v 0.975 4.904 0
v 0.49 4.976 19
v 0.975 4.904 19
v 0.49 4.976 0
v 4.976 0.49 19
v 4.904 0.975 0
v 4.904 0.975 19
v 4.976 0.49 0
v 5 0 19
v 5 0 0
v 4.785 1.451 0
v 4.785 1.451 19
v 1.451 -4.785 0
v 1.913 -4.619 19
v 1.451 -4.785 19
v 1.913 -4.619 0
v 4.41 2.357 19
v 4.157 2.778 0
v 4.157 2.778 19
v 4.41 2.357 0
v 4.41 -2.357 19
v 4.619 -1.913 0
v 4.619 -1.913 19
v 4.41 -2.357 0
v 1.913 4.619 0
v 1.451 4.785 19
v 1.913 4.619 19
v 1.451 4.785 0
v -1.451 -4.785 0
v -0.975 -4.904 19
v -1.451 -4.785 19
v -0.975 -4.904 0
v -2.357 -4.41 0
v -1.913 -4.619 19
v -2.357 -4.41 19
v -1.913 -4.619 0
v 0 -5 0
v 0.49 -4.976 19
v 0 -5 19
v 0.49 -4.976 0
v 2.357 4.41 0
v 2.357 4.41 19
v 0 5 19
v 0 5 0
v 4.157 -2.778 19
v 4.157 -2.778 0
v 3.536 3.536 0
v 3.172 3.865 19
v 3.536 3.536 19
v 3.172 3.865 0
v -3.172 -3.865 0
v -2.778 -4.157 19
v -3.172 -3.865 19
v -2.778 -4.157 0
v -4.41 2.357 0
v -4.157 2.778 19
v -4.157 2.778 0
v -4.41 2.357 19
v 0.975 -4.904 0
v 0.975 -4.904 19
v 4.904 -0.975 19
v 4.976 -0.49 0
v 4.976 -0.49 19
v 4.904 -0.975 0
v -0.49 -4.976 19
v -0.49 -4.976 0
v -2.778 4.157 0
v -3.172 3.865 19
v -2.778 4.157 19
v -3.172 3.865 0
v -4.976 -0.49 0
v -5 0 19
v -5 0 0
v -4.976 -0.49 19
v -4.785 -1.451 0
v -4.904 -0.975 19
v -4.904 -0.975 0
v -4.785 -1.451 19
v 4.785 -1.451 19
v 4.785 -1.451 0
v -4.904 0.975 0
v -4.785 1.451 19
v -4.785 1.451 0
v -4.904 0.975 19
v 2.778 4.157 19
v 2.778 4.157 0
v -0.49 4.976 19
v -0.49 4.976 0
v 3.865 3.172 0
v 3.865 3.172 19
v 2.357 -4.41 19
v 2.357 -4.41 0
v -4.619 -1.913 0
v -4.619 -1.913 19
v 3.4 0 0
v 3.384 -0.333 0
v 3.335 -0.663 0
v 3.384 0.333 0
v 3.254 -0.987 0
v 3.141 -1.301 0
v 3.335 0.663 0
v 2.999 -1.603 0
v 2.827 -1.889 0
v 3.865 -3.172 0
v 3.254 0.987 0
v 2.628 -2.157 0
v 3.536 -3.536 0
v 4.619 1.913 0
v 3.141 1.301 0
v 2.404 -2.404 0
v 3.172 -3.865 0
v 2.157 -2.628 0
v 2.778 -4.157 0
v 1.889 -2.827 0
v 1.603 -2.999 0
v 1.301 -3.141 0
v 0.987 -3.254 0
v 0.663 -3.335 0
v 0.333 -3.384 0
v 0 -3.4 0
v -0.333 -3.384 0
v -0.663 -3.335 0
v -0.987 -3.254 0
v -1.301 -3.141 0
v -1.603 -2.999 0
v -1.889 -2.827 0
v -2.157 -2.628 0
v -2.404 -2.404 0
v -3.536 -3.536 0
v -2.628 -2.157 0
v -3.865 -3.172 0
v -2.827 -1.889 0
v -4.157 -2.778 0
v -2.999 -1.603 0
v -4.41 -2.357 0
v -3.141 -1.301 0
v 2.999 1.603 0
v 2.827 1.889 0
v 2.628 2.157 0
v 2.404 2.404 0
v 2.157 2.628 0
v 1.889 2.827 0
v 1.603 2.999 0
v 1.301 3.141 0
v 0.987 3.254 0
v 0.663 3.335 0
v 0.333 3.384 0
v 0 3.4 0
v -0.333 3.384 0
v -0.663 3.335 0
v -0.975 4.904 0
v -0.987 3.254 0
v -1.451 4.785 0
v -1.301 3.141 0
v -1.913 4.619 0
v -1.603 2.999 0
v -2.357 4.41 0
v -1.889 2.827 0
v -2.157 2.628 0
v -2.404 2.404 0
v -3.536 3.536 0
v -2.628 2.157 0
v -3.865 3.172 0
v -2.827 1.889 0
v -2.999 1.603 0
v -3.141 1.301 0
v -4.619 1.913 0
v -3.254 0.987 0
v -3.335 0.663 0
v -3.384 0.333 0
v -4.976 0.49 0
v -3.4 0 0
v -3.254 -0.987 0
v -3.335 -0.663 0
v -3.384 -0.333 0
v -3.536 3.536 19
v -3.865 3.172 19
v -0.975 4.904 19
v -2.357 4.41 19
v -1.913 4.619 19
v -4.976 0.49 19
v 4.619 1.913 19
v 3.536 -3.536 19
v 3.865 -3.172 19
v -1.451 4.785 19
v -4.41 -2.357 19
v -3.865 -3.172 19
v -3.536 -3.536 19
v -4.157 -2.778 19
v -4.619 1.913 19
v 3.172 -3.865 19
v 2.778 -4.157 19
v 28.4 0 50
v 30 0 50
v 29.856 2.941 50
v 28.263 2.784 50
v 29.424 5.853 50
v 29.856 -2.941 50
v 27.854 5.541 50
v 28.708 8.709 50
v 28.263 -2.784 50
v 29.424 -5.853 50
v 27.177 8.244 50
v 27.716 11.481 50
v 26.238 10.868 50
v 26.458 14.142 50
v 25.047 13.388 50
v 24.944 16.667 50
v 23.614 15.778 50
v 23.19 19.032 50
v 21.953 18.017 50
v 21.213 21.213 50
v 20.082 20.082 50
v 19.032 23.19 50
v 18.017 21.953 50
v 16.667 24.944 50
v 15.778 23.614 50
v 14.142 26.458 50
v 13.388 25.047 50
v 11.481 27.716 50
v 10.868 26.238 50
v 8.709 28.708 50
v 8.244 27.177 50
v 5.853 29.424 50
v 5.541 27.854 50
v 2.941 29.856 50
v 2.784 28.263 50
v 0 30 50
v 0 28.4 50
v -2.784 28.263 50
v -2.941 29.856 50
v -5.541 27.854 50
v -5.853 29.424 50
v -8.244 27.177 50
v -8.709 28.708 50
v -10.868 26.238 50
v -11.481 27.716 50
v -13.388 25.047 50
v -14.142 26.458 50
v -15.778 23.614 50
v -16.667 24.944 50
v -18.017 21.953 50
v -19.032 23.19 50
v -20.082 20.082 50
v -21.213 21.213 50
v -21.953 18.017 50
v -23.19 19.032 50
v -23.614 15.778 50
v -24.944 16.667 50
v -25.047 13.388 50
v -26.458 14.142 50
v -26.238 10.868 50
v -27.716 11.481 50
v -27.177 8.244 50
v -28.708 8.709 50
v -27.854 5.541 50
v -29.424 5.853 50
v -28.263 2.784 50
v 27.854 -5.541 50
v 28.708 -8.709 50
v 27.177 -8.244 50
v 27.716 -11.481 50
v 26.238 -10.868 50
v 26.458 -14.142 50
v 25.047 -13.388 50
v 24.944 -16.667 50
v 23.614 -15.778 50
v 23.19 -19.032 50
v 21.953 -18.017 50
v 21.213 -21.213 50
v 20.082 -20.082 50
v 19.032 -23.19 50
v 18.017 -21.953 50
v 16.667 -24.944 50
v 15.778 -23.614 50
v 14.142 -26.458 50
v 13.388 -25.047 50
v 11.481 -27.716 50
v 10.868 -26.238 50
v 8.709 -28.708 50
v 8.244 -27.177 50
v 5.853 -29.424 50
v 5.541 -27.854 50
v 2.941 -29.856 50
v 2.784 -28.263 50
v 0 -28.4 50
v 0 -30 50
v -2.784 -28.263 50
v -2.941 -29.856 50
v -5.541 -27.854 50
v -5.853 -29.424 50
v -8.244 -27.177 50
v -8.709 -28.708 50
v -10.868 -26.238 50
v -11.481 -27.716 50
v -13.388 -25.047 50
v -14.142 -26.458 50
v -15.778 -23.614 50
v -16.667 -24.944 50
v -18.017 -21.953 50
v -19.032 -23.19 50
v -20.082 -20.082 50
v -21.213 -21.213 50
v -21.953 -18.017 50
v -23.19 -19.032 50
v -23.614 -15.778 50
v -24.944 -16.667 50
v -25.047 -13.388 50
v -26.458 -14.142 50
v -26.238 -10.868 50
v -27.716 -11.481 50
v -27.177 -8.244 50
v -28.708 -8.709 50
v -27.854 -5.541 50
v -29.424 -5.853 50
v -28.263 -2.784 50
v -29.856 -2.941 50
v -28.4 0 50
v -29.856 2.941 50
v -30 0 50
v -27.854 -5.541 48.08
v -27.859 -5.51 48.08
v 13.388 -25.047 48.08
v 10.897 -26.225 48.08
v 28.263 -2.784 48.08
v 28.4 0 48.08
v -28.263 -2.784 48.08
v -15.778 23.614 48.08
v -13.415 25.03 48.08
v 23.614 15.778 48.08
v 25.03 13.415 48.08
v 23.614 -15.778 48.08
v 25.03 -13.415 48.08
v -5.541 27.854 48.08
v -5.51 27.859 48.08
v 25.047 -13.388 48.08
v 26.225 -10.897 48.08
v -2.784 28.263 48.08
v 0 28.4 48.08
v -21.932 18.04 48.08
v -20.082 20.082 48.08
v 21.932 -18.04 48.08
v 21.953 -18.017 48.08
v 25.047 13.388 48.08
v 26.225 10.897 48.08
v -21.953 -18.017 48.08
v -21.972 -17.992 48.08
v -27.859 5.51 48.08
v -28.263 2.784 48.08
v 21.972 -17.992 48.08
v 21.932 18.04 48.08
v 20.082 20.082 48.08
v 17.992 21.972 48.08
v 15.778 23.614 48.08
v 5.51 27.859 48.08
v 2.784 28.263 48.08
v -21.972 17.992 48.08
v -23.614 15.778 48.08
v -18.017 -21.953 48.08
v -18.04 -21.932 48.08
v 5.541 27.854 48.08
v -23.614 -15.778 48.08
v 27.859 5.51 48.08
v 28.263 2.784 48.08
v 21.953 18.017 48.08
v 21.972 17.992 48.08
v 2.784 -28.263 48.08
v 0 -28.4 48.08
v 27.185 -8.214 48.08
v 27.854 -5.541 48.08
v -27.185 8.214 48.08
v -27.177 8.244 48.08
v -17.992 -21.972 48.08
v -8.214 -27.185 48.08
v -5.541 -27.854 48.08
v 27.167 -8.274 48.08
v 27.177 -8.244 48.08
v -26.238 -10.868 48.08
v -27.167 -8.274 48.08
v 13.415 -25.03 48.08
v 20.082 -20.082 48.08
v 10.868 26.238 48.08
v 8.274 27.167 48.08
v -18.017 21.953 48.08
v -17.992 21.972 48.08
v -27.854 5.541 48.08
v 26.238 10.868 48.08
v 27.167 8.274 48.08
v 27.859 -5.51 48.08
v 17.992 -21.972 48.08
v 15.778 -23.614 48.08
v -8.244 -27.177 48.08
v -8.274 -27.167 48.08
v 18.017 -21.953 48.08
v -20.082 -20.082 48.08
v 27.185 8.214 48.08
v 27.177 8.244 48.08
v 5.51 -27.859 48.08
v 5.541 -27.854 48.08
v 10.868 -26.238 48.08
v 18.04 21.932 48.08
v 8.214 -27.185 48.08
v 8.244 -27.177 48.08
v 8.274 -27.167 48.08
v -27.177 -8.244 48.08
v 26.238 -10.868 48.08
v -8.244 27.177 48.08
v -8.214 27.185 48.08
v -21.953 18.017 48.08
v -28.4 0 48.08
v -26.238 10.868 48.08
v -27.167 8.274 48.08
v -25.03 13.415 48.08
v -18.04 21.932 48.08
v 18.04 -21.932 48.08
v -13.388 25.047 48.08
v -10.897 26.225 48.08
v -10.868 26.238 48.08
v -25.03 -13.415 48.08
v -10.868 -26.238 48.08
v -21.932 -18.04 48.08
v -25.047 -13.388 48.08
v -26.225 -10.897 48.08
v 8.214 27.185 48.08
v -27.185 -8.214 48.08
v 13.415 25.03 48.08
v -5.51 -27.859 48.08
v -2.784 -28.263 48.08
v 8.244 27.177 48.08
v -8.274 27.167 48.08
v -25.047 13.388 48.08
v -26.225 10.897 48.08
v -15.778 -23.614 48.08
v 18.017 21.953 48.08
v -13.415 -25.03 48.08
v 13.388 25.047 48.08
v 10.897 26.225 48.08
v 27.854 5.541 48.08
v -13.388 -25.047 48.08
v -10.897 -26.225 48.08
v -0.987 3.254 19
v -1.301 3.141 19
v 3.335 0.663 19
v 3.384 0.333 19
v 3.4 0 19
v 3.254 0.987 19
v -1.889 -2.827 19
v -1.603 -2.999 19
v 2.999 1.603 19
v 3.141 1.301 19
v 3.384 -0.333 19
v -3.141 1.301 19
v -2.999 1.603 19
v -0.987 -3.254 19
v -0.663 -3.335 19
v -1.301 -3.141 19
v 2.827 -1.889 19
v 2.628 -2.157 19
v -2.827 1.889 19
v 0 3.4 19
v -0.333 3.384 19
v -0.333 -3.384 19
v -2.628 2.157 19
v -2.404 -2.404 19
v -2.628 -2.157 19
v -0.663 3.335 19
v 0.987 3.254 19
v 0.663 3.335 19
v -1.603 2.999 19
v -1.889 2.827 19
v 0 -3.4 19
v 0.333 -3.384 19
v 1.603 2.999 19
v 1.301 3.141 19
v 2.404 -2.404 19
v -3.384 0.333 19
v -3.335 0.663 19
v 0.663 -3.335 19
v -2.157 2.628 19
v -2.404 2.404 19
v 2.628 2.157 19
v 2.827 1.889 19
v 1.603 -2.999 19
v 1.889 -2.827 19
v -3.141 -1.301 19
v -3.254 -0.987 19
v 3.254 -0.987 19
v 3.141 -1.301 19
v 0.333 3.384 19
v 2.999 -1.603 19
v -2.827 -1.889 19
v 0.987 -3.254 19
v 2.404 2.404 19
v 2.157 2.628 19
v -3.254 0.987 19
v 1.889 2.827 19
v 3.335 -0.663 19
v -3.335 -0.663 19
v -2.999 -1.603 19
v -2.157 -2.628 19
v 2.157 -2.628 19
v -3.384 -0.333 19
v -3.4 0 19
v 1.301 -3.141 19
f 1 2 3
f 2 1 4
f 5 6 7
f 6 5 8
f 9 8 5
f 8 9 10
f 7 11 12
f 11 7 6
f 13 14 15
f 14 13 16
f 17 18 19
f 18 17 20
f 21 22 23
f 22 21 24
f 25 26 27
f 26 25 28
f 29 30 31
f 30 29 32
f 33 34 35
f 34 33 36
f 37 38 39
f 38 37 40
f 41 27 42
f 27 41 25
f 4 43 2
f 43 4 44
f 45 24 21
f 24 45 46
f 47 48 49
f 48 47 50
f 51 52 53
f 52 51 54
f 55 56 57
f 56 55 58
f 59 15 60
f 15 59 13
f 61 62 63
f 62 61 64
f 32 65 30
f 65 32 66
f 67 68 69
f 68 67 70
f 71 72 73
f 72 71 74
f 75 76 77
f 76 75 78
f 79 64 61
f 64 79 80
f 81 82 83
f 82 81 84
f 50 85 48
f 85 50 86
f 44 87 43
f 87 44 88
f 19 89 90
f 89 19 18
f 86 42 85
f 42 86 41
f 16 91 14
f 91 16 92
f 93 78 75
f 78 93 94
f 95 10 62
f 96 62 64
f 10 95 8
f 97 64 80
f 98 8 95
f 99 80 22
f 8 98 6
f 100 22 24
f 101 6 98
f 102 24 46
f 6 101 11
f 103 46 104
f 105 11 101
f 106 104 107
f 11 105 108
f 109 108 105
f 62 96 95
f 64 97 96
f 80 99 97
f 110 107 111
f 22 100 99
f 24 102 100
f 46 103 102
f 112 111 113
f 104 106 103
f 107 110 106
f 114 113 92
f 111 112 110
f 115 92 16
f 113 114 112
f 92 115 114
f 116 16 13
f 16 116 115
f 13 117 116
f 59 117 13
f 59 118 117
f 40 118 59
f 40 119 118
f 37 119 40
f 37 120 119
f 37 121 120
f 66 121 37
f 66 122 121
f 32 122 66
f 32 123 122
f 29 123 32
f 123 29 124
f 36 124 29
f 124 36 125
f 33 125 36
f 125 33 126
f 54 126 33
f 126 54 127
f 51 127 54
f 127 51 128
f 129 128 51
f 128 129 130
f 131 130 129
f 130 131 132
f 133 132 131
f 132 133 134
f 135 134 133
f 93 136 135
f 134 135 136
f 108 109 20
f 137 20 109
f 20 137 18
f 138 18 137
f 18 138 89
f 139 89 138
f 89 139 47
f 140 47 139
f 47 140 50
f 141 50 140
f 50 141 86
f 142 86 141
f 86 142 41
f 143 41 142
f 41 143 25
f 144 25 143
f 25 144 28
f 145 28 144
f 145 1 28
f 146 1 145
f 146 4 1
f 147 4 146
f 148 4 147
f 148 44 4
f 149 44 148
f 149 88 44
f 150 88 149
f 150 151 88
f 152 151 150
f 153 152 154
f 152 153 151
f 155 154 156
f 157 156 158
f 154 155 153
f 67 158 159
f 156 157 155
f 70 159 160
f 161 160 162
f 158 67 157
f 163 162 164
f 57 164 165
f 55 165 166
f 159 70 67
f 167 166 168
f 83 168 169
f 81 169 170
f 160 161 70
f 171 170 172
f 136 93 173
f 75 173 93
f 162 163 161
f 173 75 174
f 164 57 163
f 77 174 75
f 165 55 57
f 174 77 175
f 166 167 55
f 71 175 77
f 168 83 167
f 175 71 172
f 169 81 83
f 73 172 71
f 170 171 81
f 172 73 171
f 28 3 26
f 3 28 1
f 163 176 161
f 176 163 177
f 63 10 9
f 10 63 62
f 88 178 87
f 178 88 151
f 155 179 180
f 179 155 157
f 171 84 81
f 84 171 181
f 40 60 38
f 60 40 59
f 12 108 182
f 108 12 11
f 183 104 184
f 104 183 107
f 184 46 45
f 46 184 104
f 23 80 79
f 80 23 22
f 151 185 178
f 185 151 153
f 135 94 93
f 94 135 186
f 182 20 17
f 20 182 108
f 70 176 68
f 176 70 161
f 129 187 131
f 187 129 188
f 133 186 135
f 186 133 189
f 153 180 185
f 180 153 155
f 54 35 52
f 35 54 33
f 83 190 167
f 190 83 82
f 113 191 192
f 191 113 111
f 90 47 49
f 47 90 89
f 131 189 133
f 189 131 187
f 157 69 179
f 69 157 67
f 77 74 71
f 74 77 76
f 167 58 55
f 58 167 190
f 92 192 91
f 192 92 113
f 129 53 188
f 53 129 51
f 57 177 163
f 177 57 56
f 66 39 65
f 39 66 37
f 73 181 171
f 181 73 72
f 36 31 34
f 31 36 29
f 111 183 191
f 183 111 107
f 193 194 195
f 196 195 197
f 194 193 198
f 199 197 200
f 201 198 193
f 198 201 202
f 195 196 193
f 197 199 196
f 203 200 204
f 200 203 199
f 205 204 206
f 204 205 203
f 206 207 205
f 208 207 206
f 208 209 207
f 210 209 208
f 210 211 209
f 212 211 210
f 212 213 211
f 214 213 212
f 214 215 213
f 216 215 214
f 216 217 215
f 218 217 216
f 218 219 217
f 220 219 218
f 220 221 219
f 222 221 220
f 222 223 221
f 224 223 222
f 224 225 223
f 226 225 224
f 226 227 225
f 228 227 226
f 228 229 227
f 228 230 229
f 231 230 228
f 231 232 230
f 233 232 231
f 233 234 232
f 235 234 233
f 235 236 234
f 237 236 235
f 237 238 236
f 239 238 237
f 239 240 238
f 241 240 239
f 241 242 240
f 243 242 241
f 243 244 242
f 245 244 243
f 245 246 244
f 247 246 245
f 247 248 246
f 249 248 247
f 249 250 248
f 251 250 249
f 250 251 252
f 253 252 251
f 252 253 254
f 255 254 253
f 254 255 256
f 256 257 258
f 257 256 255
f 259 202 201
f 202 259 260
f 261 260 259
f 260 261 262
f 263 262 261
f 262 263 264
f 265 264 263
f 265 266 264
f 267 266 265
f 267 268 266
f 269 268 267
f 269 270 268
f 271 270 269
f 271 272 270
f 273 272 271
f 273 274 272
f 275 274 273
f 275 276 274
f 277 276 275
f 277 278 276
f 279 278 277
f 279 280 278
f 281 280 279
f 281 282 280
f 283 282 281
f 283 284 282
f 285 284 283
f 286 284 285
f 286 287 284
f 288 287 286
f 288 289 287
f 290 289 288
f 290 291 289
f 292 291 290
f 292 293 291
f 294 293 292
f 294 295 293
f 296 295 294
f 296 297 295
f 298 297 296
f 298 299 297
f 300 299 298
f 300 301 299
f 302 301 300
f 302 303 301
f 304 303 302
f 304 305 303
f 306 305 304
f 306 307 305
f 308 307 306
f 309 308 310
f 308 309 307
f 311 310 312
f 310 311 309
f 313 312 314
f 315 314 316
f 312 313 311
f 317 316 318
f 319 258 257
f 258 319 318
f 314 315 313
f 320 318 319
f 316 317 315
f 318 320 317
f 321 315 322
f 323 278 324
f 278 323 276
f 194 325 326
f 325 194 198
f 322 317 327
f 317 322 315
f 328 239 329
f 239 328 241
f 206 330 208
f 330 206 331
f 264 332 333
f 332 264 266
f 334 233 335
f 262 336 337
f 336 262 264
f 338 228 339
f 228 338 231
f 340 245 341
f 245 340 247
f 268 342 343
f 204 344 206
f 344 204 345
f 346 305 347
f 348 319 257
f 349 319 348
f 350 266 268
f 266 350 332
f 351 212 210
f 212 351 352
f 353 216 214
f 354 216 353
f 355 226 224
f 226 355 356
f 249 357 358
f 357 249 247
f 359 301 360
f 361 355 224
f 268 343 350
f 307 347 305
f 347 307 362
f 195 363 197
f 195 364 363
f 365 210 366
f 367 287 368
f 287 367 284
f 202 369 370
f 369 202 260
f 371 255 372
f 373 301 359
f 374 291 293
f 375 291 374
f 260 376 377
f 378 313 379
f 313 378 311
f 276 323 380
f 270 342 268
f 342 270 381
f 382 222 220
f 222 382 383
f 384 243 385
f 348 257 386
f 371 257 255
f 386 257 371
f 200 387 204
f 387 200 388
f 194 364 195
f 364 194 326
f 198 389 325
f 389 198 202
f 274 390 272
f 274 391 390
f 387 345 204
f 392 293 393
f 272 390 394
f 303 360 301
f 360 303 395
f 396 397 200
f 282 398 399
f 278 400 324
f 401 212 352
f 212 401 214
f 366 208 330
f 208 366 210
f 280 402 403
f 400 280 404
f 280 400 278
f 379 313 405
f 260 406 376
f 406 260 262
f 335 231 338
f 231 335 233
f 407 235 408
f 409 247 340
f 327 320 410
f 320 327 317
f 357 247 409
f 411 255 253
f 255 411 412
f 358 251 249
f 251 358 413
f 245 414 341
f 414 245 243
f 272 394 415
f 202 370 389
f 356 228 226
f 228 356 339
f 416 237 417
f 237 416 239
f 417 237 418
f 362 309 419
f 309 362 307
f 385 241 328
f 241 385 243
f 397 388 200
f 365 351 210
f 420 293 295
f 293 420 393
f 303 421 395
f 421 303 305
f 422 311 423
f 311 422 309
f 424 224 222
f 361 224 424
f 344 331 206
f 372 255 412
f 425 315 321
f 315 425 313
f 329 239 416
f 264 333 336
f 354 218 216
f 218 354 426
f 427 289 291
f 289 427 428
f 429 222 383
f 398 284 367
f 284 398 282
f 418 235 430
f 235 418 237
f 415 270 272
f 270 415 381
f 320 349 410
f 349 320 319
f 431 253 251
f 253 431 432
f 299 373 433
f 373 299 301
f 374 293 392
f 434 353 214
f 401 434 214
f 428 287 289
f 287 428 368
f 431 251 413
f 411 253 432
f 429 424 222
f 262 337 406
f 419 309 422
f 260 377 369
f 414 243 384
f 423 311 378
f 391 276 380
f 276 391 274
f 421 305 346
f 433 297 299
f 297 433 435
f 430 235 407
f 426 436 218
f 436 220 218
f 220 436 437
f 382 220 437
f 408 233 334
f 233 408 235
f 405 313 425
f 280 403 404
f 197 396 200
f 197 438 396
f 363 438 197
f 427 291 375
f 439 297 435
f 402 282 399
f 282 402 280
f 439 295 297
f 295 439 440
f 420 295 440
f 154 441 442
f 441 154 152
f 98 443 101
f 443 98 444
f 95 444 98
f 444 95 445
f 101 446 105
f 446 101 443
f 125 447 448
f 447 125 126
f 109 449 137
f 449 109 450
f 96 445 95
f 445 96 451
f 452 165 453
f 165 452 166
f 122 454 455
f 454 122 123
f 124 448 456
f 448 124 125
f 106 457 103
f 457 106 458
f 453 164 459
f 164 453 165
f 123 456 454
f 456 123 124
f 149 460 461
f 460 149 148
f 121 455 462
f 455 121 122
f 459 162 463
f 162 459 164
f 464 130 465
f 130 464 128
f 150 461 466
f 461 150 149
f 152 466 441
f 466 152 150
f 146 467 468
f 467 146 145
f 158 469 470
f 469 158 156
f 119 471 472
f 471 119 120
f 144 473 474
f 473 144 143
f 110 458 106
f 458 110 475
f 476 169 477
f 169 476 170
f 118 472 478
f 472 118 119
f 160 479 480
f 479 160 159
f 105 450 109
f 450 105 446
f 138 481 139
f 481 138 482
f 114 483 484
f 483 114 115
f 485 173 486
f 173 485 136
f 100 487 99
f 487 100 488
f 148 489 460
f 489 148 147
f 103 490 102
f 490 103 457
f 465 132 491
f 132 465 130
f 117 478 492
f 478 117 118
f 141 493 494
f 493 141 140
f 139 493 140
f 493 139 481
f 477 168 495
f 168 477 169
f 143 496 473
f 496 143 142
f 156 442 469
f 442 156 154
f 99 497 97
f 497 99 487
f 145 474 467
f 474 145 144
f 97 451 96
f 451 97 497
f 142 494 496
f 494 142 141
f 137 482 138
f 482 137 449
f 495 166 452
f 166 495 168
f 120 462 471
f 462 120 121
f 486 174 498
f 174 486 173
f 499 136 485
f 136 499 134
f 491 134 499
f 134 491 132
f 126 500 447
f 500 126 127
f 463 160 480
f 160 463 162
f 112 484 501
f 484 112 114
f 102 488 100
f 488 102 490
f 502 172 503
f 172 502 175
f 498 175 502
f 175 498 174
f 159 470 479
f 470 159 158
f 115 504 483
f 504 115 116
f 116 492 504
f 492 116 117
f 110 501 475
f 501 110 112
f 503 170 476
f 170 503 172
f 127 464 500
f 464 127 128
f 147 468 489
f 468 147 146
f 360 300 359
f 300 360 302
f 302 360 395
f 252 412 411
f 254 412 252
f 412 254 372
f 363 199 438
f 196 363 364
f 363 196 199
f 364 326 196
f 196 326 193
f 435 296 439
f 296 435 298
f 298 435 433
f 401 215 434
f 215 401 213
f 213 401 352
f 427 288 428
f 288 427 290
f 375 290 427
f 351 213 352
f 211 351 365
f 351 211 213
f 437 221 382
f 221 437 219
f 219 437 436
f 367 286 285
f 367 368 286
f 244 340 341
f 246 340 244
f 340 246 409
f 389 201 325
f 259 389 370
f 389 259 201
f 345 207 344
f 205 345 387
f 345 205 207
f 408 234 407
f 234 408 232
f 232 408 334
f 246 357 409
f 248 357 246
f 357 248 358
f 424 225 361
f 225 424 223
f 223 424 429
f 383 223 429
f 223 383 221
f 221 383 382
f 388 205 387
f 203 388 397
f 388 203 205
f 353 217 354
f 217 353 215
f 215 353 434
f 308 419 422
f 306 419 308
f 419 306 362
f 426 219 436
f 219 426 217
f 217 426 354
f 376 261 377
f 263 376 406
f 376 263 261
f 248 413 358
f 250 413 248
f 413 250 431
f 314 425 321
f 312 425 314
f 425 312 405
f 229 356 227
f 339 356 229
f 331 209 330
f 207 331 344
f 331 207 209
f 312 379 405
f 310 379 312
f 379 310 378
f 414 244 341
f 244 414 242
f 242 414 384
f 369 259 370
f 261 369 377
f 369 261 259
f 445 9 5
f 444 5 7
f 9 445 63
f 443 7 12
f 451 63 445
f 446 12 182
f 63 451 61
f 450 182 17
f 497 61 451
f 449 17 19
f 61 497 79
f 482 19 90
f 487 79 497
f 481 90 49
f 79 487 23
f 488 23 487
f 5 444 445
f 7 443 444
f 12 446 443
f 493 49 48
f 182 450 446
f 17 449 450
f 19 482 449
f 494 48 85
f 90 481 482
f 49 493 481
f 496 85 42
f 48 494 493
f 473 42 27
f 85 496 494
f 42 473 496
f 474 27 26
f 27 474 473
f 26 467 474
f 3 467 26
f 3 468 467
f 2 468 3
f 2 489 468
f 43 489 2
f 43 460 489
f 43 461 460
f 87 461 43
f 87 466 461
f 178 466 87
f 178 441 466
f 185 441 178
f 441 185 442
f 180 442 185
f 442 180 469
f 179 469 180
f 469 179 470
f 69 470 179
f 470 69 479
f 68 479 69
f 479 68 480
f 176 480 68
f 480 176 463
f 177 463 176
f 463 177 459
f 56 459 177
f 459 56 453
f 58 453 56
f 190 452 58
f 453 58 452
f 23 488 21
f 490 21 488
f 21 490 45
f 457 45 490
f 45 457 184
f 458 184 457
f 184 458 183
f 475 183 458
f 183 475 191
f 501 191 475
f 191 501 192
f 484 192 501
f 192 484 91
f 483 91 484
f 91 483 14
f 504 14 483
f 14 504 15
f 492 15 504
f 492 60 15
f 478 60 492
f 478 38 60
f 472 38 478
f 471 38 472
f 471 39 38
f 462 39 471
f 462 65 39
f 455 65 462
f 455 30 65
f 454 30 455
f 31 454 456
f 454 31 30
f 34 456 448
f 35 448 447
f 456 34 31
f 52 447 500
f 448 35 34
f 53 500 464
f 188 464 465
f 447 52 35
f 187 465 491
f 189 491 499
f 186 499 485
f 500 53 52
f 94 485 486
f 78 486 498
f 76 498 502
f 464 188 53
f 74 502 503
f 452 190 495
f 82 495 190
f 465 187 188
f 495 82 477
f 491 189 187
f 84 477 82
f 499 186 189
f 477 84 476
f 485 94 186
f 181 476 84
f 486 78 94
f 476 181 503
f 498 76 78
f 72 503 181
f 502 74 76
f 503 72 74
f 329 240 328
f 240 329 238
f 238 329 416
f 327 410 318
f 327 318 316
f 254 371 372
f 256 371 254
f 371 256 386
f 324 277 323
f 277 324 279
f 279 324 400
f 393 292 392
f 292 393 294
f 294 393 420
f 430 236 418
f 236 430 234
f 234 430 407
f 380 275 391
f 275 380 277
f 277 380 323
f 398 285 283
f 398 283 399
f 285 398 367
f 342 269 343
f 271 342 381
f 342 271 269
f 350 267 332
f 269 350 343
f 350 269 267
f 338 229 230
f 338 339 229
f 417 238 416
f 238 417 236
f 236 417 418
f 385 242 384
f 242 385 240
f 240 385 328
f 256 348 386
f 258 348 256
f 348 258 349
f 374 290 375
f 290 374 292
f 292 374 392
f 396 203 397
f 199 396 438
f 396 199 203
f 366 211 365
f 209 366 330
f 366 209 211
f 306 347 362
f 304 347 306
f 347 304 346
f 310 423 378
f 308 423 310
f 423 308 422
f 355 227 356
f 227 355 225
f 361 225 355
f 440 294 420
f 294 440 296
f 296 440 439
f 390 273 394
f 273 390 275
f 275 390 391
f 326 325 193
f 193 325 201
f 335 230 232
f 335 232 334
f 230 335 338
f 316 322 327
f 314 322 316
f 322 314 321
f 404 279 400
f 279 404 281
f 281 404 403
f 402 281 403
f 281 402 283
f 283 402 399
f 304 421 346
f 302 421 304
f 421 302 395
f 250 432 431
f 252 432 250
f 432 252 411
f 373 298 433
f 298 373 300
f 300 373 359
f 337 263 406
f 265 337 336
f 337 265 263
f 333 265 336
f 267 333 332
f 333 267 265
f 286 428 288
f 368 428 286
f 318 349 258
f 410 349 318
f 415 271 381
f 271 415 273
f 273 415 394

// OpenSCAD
// Funnel - a spout (tube) sitting under a conical section, open at both ends for fluid flow.
// NOVEL general part for a lab or control application.
//

spout_d = 10;
spout_l = 20;
cone_d  = 60;
wall    = 1.6;

$fn = 64;

ib = spout_d - 2 * wall;   // spout bore
ic = cone_d - 2 * wall;    // cone inner diameter at the spout join

difference() {
    union() {
        cylinder(h = spout_l, d = spout_d);                 // spout
        translate([0, 0, spout_l]) cylinder(h = 30, d = spout_d, $fn = 64);
        translate([0, 0, spout_l]) cylinder(h = 30, d1 = spout_d, d2 = cone_d, $fn = 64);
    }
    translate([0, 0, -1]) cylinder(h = spout_l + 2, d = ib);                     // bore through spout
    translate([0, 0, spout_l - 1]) cylinder(h = 32, d = ic);                     // inner cone surface open at end
}
